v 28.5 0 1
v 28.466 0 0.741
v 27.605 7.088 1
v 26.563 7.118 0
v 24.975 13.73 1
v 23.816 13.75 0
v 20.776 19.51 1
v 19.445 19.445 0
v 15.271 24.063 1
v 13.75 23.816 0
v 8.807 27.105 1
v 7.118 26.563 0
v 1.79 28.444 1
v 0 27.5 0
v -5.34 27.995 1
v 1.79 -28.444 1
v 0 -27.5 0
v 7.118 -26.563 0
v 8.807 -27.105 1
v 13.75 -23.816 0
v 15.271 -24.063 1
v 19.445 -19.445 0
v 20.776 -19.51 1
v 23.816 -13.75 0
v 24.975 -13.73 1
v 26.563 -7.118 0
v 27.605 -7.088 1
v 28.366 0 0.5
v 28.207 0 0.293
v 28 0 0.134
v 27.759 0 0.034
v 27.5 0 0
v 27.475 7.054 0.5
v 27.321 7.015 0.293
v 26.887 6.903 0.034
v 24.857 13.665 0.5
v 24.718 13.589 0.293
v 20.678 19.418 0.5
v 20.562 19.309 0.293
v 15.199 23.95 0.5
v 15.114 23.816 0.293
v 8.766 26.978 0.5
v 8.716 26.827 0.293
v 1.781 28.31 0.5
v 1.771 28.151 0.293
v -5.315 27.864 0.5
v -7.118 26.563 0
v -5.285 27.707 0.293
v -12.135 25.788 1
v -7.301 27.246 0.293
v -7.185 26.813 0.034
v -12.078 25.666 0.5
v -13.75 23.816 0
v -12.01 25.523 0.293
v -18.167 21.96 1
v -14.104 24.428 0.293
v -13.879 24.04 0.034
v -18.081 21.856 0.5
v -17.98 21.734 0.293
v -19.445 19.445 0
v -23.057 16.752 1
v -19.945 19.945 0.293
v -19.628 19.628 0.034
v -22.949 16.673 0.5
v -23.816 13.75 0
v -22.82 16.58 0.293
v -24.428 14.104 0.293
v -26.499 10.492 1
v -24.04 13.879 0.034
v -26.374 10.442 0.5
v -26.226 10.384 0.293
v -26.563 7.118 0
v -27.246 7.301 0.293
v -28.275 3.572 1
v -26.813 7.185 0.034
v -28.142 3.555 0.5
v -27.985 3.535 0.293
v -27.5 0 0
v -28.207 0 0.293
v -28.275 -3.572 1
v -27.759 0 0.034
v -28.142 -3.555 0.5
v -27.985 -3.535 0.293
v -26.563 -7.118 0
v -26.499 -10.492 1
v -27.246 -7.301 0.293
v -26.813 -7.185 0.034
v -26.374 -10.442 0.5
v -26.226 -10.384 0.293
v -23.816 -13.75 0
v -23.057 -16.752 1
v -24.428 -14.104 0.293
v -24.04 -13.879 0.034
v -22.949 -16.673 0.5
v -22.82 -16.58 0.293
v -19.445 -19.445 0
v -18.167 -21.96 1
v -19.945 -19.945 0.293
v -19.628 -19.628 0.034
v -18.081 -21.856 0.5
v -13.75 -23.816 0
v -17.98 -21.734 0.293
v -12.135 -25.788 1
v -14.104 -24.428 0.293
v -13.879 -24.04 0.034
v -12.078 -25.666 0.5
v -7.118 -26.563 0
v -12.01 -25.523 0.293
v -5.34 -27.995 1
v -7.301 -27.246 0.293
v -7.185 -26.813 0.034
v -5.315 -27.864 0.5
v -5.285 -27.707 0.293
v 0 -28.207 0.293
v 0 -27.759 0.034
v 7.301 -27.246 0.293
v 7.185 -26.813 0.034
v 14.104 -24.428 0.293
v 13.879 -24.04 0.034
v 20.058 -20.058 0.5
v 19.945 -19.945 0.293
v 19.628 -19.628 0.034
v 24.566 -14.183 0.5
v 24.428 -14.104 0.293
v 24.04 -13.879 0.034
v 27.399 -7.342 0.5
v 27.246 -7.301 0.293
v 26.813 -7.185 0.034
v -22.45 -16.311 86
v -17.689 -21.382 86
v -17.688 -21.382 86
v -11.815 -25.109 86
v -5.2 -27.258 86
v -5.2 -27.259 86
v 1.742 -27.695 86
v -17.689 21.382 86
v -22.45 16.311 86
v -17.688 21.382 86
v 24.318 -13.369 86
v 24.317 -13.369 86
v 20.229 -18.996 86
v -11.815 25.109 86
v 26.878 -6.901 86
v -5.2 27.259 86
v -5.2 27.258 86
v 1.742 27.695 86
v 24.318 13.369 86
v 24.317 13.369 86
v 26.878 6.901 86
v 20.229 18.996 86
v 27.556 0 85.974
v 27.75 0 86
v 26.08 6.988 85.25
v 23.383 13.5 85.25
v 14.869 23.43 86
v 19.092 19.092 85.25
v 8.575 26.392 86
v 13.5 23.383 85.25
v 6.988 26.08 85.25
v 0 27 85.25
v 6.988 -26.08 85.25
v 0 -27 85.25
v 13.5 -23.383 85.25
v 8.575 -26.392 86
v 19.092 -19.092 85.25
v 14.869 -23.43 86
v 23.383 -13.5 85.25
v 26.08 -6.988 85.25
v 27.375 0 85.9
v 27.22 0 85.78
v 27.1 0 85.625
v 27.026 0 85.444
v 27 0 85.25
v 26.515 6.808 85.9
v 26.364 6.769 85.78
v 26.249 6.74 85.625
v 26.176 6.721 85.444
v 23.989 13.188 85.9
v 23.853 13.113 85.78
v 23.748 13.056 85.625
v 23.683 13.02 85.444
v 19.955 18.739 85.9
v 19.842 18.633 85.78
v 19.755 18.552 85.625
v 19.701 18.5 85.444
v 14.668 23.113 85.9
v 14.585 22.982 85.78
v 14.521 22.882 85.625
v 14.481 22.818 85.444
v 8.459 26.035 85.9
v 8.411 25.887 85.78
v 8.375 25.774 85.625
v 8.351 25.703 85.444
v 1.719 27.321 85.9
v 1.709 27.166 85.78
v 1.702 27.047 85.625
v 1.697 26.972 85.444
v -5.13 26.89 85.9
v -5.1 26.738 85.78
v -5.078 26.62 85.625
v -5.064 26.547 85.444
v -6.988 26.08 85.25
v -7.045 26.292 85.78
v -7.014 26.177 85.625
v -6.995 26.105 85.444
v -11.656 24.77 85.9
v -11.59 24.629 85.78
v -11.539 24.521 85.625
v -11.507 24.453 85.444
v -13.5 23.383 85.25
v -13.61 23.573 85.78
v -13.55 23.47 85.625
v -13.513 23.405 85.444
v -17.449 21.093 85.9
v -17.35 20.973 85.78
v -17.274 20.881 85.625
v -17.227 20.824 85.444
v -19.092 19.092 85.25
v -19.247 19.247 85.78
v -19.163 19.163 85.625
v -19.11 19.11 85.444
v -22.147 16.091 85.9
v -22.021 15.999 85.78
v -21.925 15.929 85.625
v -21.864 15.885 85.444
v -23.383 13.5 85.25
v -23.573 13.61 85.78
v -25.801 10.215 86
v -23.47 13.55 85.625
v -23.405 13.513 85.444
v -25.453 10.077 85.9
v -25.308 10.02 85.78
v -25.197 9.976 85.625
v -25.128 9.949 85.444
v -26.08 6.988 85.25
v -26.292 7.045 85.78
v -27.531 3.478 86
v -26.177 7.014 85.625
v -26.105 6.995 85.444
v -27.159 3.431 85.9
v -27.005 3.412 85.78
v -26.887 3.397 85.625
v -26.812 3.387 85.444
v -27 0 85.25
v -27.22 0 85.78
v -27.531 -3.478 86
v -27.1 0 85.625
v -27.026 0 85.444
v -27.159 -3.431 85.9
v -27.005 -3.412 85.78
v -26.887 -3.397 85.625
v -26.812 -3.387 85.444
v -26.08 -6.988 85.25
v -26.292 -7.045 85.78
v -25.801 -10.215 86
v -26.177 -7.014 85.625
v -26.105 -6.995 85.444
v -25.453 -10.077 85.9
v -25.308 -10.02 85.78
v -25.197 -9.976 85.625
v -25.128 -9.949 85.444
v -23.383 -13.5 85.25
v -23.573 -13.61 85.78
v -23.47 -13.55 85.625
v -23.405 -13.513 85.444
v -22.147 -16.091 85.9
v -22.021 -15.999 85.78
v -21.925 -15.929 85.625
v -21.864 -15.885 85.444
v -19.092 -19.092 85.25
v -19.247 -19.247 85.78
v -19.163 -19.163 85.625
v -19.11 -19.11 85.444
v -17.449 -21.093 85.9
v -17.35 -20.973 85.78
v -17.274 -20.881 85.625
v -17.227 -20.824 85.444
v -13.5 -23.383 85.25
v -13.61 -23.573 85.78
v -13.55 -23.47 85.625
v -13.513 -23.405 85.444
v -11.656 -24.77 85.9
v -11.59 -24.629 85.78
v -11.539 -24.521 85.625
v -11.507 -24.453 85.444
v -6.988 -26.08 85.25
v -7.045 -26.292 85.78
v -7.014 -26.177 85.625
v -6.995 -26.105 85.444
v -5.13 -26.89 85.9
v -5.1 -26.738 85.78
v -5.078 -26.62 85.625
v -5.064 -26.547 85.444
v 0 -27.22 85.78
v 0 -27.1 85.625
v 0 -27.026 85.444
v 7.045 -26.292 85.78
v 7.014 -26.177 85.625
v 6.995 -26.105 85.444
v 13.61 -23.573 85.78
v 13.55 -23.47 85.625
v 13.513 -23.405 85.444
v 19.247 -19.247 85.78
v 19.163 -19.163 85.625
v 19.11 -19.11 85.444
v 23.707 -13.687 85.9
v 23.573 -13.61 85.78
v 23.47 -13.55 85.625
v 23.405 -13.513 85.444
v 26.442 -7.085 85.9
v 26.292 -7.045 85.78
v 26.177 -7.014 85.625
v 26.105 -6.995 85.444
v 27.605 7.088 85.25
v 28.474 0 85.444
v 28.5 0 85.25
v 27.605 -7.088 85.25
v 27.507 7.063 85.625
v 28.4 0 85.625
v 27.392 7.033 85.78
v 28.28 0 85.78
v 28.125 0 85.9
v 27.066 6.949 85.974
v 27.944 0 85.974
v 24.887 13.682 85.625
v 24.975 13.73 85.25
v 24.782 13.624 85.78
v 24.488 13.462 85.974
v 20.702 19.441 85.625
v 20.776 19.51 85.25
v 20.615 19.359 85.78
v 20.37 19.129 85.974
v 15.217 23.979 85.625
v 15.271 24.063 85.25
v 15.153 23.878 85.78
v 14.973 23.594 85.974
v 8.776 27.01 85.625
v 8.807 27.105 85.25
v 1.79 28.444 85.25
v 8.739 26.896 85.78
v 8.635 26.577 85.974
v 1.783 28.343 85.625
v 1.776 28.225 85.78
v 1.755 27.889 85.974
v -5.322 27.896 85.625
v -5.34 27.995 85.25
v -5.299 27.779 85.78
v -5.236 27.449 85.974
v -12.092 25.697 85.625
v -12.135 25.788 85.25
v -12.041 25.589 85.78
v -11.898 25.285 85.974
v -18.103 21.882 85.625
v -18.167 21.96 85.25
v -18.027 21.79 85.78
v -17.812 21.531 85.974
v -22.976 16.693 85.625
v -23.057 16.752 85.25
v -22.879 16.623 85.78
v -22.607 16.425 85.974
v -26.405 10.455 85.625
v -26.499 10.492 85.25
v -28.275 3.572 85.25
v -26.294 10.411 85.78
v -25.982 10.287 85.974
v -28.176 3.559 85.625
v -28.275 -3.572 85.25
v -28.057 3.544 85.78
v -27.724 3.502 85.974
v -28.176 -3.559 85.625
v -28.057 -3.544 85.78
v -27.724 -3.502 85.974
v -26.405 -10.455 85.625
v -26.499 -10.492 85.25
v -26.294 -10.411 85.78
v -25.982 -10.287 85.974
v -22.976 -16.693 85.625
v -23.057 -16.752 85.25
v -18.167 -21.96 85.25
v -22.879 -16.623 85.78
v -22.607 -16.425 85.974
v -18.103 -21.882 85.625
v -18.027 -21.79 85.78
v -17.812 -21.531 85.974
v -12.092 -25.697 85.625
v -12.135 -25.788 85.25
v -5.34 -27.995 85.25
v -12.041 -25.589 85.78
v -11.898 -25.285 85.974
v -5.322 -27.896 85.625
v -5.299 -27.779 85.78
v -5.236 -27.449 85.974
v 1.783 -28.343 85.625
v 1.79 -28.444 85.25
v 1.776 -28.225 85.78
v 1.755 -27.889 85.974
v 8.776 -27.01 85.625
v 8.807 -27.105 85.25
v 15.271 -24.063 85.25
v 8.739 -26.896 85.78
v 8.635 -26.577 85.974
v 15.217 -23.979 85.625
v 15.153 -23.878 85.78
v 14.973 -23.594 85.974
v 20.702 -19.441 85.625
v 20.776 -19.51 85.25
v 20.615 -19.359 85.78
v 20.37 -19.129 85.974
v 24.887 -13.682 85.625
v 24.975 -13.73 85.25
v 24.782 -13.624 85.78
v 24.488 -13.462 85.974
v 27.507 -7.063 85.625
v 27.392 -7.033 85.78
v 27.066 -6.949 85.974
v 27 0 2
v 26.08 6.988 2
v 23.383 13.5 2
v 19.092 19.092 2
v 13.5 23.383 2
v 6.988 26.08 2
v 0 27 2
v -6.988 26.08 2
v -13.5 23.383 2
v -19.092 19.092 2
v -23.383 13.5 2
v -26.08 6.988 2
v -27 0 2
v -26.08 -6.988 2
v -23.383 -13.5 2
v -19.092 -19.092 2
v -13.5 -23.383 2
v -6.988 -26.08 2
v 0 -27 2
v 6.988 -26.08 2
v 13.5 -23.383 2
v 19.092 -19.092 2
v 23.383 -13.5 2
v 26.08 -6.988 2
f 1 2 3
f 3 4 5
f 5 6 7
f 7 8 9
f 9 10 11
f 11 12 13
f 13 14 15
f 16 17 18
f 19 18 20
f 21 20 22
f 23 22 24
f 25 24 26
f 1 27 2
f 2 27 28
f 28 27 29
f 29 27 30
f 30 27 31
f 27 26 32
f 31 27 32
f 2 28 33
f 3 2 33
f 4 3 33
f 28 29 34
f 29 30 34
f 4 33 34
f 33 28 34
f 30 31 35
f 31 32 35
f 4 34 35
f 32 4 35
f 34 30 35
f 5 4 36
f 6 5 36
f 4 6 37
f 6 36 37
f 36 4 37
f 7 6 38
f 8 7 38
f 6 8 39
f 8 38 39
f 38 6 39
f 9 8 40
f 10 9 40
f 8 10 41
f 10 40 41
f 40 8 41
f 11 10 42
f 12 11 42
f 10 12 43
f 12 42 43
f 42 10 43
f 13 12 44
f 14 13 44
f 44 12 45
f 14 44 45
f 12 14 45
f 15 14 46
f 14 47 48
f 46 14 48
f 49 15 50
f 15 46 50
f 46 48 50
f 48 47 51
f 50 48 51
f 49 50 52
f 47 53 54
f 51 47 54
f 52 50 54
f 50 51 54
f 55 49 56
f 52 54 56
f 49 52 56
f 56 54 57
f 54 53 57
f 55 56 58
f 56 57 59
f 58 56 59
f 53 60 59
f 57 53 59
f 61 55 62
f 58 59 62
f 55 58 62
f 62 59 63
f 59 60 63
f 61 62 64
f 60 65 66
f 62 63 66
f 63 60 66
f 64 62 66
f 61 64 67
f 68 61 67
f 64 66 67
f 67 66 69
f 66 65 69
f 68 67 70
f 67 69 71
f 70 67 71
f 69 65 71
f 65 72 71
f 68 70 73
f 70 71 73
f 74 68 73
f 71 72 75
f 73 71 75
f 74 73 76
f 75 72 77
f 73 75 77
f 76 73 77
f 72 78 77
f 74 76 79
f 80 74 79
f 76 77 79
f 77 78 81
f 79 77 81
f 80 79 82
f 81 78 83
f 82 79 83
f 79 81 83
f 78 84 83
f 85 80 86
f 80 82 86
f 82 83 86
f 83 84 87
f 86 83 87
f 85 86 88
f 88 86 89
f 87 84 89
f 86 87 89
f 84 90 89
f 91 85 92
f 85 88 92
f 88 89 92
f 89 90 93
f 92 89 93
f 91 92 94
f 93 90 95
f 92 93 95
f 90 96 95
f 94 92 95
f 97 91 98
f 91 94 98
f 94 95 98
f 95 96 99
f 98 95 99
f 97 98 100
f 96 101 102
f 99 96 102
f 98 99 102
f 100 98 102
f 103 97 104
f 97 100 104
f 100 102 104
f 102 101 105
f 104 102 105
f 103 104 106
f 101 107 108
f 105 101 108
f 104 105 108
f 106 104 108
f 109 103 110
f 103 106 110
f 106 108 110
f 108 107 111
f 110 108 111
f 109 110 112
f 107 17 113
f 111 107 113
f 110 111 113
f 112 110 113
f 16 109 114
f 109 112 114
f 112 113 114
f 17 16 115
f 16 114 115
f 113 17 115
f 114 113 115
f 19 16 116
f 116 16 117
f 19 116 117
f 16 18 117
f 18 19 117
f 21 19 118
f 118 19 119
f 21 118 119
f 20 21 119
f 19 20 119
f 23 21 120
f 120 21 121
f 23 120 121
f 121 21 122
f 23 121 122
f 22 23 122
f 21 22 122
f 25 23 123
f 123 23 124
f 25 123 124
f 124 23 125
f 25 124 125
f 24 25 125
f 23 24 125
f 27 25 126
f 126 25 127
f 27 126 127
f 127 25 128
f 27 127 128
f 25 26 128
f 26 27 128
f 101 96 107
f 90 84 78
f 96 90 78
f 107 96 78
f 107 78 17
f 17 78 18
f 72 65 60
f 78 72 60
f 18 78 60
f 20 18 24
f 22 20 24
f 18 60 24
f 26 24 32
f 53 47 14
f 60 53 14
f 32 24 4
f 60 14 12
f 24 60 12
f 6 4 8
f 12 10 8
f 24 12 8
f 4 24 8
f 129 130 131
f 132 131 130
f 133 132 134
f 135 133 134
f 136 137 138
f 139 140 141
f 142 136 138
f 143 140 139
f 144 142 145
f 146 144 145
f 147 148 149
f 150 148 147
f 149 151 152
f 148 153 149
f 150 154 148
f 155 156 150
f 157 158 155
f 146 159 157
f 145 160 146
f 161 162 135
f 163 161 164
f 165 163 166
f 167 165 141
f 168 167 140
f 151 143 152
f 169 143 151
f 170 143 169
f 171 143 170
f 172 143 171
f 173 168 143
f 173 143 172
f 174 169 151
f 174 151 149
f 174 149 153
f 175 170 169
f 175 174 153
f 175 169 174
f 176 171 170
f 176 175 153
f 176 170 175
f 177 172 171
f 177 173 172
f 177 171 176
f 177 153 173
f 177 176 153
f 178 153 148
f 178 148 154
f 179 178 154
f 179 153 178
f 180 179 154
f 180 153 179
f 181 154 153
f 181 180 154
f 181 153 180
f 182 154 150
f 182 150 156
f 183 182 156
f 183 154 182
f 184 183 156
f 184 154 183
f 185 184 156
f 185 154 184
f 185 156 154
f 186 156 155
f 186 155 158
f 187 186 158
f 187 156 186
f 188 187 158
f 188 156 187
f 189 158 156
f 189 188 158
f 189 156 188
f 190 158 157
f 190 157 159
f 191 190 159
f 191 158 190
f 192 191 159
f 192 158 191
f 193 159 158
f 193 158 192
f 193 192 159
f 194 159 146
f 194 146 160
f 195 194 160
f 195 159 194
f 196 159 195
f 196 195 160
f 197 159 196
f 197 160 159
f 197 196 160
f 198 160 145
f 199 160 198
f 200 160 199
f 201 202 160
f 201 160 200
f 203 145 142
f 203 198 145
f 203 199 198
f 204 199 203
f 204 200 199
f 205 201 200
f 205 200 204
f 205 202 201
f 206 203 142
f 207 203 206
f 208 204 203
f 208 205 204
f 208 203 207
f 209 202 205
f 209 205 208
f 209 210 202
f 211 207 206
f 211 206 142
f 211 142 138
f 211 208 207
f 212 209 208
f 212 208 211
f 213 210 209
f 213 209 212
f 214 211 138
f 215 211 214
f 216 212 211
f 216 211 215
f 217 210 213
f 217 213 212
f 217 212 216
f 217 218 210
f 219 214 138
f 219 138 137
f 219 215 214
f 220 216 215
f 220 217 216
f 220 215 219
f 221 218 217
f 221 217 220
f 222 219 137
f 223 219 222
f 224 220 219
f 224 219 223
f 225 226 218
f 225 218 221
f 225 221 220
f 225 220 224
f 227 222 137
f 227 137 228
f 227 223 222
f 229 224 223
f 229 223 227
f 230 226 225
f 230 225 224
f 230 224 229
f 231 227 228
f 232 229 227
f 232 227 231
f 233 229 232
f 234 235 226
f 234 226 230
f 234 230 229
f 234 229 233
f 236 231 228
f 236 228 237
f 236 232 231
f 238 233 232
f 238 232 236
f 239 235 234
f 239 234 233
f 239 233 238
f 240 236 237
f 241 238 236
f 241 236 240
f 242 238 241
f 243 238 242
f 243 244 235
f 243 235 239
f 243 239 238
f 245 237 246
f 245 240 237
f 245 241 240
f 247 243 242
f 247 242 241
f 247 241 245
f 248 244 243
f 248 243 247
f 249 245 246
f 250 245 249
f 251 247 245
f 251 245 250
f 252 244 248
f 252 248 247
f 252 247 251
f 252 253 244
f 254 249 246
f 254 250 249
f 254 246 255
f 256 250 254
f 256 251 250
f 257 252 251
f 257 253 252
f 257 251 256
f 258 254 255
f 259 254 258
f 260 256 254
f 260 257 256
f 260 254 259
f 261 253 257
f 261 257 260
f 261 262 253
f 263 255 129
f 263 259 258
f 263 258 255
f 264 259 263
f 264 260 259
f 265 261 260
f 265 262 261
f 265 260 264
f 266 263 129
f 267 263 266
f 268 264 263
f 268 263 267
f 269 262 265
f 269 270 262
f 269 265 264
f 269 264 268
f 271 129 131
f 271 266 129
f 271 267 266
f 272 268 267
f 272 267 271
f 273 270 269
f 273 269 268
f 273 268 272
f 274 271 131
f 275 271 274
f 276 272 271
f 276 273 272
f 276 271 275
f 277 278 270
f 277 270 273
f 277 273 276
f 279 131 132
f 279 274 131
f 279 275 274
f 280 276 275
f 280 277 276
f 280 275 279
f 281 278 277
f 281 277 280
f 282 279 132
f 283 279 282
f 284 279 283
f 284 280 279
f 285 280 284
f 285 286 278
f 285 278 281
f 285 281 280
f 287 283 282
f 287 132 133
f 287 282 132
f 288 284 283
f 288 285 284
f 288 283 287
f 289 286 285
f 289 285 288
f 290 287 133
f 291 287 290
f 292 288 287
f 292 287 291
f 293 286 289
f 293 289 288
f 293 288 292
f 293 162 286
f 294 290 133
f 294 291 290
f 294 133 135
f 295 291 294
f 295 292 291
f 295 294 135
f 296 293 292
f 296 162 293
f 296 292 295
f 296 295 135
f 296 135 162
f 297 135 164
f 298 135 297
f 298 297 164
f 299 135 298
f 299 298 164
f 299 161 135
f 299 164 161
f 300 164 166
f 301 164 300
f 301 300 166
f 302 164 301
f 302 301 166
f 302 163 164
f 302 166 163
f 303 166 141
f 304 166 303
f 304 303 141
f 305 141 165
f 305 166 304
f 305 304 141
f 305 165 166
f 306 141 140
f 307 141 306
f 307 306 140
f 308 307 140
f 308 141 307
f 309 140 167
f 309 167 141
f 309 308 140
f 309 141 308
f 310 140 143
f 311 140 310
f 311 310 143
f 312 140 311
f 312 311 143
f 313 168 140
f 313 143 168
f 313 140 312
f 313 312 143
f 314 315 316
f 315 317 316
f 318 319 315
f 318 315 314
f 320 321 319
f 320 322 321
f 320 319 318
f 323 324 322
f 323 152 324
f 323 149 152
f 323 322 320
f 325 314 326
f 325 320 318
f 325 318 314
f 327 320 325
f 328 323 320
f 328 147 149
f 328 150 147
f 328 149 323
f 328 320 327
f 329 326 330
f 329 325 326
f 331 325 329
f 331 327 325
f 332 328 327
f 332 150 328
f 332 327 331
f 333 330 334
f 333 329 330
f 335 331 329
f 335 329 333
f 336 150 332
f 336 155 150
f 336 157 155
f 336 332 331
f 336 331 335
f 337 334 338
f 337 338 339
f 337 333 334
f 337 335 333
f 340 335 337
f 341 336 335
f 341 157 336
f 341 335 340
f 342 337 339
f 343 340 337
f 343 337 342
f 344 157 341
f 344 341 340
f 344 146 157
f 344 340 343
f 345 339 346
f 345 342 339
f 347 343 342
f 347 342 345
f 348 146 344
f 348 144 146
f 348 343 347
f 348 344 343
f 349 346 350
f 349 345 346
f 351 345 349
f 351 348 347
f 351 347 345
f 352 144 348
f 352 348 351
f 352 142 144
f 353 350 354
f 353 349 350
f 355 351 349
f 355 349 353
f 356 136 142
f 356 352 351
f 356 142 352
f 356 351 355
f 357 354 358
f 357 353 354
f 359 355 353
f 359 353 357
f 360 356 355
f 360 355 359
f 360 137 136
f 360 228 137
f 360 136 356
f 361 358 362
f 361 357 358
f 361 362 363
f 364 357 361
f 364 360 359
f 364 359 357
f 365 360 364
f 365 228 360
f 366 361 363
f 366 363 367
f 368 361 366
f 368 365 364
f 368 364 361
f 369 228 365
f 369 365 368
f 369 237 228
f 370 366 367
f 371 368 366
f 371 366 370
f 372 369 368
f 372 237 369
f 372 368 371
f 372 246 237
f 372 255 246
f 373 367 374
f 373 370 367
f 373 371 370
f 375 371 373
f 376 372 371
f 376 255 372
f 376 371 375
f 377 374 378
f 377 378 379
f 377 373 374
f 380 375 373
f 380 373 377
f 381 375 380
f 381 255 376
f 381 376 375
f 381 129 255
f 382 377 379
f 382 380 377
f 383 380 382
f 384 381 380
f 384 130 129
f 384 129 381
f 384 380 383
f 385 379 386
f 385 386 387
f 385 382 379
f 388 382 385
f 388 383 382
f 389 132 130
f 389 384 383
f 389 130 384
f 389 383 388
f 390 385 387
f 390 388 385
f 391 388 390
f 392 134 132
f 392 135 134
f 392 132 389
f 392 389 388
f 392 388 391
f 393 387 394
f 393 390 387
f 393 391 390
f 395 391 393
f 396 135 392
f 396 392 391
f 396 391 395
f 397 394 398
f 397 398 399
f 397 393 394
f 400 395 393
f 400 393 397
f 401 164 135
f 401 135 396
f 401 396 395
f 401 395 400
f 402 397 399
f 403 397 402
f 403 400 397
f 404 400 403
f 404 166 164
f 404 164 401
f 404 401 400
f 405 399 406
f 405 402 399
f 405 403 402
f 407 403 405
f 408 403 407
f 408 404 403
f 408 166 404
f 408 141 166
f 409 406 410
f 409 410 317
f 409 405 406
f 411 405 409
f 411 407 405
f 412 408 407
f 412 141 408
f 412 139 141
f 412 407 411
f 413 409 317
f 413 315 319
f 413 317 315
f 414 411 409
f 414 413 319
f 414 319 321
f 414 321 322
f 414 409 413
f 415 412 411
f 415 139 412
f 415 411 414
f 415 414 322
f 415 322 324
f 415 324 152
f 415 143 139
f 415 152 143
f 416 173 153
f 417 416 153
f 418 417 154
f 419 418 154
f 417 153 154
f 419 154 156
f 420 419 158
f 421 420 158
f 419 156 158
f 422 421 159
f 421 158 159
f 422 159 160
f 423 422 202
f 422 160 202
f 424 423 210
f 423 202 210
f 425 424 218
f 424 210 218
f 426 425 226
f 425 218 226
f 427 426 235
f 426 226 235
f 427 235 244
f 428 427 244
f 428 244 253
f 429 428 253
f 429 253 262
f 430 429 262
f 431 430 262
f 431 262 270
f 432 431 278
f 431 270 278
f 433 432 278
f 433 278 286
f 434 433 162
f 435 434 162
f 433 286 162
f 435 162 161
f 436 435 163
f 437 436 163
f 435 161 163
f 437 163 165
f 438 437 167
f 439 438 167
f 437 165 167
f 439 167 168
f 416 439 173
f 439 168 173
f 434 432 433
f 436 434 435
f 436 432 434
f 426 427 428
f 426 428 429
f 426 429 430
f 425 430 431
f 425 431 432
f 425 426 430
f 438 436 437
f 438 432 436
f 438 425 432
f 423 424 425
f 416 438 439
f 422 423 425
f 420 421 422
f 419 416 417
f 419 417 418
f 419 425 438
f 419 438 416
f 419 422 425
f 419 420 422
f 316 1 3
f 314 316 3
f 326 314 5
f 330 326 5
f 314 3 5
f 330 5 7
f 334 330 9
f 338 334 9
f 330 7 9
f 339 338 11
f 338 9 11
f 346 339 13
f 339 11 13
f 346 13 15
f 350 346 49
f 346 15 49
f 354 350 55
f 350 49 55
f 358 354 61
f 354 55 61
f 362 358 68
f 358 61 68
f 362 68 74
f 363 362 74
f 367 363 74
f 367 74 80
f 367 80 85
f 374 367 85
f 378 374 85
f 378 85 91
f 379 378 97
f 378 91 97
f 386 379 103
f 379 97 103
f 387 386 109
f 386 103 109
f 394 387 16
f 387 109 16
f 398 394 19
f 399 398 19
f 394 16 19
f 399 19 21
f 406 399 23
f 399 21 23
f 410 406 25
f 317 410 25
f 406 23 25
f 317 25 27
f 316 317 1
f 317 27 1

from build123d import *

# Parameters (mm, degrees)
SKETCH1_R           = 28.5
BOSS_EXTRUDE1_DEPTH = 86
SKETCH2_R           = 27
CUT_EXTRUDE1_DEPTH  = 84
FILLET1_R           = 1
FILLET2_R           = 0.75


with BuildPart() as part:
    # Sketch1 → Boss-Extrude1 (new body)
    with BuildSketch(Plane.XY):
        Circle(SKETCH1_R)
    extrude(amount=BOSS_EXTRUDE1_DEPTH)

    # Sketch2 → Cut-Extrude1 (cut)
    with BuildSketch(Plane.XY.offset(86)):
        Circle(SKETCH2_R)
    extrude(amount=-CUT_EXTRUDE1_DEPTH, mode=Mode.SUBTRACT)

    # Fillet1
    fillet1_edges = [part.edges().sort_by_distance(p)[0] for p in [
        (-28.5, 0, 0),
    ]]
    fillet(fillet1_edges, radius=FILLET1_R)

    # Fillet2
    fillet2_edges = [part.edges().sort_by_distance(p)[0] for p in [
        (-28.5, 0, 86),
        (-27, 0, 86),
    ]]
    fillet(fillet2_edges, radius=FILLET2_R - 0.0001)  # a hair under: the kernel refuses the full size


solid = part.part
